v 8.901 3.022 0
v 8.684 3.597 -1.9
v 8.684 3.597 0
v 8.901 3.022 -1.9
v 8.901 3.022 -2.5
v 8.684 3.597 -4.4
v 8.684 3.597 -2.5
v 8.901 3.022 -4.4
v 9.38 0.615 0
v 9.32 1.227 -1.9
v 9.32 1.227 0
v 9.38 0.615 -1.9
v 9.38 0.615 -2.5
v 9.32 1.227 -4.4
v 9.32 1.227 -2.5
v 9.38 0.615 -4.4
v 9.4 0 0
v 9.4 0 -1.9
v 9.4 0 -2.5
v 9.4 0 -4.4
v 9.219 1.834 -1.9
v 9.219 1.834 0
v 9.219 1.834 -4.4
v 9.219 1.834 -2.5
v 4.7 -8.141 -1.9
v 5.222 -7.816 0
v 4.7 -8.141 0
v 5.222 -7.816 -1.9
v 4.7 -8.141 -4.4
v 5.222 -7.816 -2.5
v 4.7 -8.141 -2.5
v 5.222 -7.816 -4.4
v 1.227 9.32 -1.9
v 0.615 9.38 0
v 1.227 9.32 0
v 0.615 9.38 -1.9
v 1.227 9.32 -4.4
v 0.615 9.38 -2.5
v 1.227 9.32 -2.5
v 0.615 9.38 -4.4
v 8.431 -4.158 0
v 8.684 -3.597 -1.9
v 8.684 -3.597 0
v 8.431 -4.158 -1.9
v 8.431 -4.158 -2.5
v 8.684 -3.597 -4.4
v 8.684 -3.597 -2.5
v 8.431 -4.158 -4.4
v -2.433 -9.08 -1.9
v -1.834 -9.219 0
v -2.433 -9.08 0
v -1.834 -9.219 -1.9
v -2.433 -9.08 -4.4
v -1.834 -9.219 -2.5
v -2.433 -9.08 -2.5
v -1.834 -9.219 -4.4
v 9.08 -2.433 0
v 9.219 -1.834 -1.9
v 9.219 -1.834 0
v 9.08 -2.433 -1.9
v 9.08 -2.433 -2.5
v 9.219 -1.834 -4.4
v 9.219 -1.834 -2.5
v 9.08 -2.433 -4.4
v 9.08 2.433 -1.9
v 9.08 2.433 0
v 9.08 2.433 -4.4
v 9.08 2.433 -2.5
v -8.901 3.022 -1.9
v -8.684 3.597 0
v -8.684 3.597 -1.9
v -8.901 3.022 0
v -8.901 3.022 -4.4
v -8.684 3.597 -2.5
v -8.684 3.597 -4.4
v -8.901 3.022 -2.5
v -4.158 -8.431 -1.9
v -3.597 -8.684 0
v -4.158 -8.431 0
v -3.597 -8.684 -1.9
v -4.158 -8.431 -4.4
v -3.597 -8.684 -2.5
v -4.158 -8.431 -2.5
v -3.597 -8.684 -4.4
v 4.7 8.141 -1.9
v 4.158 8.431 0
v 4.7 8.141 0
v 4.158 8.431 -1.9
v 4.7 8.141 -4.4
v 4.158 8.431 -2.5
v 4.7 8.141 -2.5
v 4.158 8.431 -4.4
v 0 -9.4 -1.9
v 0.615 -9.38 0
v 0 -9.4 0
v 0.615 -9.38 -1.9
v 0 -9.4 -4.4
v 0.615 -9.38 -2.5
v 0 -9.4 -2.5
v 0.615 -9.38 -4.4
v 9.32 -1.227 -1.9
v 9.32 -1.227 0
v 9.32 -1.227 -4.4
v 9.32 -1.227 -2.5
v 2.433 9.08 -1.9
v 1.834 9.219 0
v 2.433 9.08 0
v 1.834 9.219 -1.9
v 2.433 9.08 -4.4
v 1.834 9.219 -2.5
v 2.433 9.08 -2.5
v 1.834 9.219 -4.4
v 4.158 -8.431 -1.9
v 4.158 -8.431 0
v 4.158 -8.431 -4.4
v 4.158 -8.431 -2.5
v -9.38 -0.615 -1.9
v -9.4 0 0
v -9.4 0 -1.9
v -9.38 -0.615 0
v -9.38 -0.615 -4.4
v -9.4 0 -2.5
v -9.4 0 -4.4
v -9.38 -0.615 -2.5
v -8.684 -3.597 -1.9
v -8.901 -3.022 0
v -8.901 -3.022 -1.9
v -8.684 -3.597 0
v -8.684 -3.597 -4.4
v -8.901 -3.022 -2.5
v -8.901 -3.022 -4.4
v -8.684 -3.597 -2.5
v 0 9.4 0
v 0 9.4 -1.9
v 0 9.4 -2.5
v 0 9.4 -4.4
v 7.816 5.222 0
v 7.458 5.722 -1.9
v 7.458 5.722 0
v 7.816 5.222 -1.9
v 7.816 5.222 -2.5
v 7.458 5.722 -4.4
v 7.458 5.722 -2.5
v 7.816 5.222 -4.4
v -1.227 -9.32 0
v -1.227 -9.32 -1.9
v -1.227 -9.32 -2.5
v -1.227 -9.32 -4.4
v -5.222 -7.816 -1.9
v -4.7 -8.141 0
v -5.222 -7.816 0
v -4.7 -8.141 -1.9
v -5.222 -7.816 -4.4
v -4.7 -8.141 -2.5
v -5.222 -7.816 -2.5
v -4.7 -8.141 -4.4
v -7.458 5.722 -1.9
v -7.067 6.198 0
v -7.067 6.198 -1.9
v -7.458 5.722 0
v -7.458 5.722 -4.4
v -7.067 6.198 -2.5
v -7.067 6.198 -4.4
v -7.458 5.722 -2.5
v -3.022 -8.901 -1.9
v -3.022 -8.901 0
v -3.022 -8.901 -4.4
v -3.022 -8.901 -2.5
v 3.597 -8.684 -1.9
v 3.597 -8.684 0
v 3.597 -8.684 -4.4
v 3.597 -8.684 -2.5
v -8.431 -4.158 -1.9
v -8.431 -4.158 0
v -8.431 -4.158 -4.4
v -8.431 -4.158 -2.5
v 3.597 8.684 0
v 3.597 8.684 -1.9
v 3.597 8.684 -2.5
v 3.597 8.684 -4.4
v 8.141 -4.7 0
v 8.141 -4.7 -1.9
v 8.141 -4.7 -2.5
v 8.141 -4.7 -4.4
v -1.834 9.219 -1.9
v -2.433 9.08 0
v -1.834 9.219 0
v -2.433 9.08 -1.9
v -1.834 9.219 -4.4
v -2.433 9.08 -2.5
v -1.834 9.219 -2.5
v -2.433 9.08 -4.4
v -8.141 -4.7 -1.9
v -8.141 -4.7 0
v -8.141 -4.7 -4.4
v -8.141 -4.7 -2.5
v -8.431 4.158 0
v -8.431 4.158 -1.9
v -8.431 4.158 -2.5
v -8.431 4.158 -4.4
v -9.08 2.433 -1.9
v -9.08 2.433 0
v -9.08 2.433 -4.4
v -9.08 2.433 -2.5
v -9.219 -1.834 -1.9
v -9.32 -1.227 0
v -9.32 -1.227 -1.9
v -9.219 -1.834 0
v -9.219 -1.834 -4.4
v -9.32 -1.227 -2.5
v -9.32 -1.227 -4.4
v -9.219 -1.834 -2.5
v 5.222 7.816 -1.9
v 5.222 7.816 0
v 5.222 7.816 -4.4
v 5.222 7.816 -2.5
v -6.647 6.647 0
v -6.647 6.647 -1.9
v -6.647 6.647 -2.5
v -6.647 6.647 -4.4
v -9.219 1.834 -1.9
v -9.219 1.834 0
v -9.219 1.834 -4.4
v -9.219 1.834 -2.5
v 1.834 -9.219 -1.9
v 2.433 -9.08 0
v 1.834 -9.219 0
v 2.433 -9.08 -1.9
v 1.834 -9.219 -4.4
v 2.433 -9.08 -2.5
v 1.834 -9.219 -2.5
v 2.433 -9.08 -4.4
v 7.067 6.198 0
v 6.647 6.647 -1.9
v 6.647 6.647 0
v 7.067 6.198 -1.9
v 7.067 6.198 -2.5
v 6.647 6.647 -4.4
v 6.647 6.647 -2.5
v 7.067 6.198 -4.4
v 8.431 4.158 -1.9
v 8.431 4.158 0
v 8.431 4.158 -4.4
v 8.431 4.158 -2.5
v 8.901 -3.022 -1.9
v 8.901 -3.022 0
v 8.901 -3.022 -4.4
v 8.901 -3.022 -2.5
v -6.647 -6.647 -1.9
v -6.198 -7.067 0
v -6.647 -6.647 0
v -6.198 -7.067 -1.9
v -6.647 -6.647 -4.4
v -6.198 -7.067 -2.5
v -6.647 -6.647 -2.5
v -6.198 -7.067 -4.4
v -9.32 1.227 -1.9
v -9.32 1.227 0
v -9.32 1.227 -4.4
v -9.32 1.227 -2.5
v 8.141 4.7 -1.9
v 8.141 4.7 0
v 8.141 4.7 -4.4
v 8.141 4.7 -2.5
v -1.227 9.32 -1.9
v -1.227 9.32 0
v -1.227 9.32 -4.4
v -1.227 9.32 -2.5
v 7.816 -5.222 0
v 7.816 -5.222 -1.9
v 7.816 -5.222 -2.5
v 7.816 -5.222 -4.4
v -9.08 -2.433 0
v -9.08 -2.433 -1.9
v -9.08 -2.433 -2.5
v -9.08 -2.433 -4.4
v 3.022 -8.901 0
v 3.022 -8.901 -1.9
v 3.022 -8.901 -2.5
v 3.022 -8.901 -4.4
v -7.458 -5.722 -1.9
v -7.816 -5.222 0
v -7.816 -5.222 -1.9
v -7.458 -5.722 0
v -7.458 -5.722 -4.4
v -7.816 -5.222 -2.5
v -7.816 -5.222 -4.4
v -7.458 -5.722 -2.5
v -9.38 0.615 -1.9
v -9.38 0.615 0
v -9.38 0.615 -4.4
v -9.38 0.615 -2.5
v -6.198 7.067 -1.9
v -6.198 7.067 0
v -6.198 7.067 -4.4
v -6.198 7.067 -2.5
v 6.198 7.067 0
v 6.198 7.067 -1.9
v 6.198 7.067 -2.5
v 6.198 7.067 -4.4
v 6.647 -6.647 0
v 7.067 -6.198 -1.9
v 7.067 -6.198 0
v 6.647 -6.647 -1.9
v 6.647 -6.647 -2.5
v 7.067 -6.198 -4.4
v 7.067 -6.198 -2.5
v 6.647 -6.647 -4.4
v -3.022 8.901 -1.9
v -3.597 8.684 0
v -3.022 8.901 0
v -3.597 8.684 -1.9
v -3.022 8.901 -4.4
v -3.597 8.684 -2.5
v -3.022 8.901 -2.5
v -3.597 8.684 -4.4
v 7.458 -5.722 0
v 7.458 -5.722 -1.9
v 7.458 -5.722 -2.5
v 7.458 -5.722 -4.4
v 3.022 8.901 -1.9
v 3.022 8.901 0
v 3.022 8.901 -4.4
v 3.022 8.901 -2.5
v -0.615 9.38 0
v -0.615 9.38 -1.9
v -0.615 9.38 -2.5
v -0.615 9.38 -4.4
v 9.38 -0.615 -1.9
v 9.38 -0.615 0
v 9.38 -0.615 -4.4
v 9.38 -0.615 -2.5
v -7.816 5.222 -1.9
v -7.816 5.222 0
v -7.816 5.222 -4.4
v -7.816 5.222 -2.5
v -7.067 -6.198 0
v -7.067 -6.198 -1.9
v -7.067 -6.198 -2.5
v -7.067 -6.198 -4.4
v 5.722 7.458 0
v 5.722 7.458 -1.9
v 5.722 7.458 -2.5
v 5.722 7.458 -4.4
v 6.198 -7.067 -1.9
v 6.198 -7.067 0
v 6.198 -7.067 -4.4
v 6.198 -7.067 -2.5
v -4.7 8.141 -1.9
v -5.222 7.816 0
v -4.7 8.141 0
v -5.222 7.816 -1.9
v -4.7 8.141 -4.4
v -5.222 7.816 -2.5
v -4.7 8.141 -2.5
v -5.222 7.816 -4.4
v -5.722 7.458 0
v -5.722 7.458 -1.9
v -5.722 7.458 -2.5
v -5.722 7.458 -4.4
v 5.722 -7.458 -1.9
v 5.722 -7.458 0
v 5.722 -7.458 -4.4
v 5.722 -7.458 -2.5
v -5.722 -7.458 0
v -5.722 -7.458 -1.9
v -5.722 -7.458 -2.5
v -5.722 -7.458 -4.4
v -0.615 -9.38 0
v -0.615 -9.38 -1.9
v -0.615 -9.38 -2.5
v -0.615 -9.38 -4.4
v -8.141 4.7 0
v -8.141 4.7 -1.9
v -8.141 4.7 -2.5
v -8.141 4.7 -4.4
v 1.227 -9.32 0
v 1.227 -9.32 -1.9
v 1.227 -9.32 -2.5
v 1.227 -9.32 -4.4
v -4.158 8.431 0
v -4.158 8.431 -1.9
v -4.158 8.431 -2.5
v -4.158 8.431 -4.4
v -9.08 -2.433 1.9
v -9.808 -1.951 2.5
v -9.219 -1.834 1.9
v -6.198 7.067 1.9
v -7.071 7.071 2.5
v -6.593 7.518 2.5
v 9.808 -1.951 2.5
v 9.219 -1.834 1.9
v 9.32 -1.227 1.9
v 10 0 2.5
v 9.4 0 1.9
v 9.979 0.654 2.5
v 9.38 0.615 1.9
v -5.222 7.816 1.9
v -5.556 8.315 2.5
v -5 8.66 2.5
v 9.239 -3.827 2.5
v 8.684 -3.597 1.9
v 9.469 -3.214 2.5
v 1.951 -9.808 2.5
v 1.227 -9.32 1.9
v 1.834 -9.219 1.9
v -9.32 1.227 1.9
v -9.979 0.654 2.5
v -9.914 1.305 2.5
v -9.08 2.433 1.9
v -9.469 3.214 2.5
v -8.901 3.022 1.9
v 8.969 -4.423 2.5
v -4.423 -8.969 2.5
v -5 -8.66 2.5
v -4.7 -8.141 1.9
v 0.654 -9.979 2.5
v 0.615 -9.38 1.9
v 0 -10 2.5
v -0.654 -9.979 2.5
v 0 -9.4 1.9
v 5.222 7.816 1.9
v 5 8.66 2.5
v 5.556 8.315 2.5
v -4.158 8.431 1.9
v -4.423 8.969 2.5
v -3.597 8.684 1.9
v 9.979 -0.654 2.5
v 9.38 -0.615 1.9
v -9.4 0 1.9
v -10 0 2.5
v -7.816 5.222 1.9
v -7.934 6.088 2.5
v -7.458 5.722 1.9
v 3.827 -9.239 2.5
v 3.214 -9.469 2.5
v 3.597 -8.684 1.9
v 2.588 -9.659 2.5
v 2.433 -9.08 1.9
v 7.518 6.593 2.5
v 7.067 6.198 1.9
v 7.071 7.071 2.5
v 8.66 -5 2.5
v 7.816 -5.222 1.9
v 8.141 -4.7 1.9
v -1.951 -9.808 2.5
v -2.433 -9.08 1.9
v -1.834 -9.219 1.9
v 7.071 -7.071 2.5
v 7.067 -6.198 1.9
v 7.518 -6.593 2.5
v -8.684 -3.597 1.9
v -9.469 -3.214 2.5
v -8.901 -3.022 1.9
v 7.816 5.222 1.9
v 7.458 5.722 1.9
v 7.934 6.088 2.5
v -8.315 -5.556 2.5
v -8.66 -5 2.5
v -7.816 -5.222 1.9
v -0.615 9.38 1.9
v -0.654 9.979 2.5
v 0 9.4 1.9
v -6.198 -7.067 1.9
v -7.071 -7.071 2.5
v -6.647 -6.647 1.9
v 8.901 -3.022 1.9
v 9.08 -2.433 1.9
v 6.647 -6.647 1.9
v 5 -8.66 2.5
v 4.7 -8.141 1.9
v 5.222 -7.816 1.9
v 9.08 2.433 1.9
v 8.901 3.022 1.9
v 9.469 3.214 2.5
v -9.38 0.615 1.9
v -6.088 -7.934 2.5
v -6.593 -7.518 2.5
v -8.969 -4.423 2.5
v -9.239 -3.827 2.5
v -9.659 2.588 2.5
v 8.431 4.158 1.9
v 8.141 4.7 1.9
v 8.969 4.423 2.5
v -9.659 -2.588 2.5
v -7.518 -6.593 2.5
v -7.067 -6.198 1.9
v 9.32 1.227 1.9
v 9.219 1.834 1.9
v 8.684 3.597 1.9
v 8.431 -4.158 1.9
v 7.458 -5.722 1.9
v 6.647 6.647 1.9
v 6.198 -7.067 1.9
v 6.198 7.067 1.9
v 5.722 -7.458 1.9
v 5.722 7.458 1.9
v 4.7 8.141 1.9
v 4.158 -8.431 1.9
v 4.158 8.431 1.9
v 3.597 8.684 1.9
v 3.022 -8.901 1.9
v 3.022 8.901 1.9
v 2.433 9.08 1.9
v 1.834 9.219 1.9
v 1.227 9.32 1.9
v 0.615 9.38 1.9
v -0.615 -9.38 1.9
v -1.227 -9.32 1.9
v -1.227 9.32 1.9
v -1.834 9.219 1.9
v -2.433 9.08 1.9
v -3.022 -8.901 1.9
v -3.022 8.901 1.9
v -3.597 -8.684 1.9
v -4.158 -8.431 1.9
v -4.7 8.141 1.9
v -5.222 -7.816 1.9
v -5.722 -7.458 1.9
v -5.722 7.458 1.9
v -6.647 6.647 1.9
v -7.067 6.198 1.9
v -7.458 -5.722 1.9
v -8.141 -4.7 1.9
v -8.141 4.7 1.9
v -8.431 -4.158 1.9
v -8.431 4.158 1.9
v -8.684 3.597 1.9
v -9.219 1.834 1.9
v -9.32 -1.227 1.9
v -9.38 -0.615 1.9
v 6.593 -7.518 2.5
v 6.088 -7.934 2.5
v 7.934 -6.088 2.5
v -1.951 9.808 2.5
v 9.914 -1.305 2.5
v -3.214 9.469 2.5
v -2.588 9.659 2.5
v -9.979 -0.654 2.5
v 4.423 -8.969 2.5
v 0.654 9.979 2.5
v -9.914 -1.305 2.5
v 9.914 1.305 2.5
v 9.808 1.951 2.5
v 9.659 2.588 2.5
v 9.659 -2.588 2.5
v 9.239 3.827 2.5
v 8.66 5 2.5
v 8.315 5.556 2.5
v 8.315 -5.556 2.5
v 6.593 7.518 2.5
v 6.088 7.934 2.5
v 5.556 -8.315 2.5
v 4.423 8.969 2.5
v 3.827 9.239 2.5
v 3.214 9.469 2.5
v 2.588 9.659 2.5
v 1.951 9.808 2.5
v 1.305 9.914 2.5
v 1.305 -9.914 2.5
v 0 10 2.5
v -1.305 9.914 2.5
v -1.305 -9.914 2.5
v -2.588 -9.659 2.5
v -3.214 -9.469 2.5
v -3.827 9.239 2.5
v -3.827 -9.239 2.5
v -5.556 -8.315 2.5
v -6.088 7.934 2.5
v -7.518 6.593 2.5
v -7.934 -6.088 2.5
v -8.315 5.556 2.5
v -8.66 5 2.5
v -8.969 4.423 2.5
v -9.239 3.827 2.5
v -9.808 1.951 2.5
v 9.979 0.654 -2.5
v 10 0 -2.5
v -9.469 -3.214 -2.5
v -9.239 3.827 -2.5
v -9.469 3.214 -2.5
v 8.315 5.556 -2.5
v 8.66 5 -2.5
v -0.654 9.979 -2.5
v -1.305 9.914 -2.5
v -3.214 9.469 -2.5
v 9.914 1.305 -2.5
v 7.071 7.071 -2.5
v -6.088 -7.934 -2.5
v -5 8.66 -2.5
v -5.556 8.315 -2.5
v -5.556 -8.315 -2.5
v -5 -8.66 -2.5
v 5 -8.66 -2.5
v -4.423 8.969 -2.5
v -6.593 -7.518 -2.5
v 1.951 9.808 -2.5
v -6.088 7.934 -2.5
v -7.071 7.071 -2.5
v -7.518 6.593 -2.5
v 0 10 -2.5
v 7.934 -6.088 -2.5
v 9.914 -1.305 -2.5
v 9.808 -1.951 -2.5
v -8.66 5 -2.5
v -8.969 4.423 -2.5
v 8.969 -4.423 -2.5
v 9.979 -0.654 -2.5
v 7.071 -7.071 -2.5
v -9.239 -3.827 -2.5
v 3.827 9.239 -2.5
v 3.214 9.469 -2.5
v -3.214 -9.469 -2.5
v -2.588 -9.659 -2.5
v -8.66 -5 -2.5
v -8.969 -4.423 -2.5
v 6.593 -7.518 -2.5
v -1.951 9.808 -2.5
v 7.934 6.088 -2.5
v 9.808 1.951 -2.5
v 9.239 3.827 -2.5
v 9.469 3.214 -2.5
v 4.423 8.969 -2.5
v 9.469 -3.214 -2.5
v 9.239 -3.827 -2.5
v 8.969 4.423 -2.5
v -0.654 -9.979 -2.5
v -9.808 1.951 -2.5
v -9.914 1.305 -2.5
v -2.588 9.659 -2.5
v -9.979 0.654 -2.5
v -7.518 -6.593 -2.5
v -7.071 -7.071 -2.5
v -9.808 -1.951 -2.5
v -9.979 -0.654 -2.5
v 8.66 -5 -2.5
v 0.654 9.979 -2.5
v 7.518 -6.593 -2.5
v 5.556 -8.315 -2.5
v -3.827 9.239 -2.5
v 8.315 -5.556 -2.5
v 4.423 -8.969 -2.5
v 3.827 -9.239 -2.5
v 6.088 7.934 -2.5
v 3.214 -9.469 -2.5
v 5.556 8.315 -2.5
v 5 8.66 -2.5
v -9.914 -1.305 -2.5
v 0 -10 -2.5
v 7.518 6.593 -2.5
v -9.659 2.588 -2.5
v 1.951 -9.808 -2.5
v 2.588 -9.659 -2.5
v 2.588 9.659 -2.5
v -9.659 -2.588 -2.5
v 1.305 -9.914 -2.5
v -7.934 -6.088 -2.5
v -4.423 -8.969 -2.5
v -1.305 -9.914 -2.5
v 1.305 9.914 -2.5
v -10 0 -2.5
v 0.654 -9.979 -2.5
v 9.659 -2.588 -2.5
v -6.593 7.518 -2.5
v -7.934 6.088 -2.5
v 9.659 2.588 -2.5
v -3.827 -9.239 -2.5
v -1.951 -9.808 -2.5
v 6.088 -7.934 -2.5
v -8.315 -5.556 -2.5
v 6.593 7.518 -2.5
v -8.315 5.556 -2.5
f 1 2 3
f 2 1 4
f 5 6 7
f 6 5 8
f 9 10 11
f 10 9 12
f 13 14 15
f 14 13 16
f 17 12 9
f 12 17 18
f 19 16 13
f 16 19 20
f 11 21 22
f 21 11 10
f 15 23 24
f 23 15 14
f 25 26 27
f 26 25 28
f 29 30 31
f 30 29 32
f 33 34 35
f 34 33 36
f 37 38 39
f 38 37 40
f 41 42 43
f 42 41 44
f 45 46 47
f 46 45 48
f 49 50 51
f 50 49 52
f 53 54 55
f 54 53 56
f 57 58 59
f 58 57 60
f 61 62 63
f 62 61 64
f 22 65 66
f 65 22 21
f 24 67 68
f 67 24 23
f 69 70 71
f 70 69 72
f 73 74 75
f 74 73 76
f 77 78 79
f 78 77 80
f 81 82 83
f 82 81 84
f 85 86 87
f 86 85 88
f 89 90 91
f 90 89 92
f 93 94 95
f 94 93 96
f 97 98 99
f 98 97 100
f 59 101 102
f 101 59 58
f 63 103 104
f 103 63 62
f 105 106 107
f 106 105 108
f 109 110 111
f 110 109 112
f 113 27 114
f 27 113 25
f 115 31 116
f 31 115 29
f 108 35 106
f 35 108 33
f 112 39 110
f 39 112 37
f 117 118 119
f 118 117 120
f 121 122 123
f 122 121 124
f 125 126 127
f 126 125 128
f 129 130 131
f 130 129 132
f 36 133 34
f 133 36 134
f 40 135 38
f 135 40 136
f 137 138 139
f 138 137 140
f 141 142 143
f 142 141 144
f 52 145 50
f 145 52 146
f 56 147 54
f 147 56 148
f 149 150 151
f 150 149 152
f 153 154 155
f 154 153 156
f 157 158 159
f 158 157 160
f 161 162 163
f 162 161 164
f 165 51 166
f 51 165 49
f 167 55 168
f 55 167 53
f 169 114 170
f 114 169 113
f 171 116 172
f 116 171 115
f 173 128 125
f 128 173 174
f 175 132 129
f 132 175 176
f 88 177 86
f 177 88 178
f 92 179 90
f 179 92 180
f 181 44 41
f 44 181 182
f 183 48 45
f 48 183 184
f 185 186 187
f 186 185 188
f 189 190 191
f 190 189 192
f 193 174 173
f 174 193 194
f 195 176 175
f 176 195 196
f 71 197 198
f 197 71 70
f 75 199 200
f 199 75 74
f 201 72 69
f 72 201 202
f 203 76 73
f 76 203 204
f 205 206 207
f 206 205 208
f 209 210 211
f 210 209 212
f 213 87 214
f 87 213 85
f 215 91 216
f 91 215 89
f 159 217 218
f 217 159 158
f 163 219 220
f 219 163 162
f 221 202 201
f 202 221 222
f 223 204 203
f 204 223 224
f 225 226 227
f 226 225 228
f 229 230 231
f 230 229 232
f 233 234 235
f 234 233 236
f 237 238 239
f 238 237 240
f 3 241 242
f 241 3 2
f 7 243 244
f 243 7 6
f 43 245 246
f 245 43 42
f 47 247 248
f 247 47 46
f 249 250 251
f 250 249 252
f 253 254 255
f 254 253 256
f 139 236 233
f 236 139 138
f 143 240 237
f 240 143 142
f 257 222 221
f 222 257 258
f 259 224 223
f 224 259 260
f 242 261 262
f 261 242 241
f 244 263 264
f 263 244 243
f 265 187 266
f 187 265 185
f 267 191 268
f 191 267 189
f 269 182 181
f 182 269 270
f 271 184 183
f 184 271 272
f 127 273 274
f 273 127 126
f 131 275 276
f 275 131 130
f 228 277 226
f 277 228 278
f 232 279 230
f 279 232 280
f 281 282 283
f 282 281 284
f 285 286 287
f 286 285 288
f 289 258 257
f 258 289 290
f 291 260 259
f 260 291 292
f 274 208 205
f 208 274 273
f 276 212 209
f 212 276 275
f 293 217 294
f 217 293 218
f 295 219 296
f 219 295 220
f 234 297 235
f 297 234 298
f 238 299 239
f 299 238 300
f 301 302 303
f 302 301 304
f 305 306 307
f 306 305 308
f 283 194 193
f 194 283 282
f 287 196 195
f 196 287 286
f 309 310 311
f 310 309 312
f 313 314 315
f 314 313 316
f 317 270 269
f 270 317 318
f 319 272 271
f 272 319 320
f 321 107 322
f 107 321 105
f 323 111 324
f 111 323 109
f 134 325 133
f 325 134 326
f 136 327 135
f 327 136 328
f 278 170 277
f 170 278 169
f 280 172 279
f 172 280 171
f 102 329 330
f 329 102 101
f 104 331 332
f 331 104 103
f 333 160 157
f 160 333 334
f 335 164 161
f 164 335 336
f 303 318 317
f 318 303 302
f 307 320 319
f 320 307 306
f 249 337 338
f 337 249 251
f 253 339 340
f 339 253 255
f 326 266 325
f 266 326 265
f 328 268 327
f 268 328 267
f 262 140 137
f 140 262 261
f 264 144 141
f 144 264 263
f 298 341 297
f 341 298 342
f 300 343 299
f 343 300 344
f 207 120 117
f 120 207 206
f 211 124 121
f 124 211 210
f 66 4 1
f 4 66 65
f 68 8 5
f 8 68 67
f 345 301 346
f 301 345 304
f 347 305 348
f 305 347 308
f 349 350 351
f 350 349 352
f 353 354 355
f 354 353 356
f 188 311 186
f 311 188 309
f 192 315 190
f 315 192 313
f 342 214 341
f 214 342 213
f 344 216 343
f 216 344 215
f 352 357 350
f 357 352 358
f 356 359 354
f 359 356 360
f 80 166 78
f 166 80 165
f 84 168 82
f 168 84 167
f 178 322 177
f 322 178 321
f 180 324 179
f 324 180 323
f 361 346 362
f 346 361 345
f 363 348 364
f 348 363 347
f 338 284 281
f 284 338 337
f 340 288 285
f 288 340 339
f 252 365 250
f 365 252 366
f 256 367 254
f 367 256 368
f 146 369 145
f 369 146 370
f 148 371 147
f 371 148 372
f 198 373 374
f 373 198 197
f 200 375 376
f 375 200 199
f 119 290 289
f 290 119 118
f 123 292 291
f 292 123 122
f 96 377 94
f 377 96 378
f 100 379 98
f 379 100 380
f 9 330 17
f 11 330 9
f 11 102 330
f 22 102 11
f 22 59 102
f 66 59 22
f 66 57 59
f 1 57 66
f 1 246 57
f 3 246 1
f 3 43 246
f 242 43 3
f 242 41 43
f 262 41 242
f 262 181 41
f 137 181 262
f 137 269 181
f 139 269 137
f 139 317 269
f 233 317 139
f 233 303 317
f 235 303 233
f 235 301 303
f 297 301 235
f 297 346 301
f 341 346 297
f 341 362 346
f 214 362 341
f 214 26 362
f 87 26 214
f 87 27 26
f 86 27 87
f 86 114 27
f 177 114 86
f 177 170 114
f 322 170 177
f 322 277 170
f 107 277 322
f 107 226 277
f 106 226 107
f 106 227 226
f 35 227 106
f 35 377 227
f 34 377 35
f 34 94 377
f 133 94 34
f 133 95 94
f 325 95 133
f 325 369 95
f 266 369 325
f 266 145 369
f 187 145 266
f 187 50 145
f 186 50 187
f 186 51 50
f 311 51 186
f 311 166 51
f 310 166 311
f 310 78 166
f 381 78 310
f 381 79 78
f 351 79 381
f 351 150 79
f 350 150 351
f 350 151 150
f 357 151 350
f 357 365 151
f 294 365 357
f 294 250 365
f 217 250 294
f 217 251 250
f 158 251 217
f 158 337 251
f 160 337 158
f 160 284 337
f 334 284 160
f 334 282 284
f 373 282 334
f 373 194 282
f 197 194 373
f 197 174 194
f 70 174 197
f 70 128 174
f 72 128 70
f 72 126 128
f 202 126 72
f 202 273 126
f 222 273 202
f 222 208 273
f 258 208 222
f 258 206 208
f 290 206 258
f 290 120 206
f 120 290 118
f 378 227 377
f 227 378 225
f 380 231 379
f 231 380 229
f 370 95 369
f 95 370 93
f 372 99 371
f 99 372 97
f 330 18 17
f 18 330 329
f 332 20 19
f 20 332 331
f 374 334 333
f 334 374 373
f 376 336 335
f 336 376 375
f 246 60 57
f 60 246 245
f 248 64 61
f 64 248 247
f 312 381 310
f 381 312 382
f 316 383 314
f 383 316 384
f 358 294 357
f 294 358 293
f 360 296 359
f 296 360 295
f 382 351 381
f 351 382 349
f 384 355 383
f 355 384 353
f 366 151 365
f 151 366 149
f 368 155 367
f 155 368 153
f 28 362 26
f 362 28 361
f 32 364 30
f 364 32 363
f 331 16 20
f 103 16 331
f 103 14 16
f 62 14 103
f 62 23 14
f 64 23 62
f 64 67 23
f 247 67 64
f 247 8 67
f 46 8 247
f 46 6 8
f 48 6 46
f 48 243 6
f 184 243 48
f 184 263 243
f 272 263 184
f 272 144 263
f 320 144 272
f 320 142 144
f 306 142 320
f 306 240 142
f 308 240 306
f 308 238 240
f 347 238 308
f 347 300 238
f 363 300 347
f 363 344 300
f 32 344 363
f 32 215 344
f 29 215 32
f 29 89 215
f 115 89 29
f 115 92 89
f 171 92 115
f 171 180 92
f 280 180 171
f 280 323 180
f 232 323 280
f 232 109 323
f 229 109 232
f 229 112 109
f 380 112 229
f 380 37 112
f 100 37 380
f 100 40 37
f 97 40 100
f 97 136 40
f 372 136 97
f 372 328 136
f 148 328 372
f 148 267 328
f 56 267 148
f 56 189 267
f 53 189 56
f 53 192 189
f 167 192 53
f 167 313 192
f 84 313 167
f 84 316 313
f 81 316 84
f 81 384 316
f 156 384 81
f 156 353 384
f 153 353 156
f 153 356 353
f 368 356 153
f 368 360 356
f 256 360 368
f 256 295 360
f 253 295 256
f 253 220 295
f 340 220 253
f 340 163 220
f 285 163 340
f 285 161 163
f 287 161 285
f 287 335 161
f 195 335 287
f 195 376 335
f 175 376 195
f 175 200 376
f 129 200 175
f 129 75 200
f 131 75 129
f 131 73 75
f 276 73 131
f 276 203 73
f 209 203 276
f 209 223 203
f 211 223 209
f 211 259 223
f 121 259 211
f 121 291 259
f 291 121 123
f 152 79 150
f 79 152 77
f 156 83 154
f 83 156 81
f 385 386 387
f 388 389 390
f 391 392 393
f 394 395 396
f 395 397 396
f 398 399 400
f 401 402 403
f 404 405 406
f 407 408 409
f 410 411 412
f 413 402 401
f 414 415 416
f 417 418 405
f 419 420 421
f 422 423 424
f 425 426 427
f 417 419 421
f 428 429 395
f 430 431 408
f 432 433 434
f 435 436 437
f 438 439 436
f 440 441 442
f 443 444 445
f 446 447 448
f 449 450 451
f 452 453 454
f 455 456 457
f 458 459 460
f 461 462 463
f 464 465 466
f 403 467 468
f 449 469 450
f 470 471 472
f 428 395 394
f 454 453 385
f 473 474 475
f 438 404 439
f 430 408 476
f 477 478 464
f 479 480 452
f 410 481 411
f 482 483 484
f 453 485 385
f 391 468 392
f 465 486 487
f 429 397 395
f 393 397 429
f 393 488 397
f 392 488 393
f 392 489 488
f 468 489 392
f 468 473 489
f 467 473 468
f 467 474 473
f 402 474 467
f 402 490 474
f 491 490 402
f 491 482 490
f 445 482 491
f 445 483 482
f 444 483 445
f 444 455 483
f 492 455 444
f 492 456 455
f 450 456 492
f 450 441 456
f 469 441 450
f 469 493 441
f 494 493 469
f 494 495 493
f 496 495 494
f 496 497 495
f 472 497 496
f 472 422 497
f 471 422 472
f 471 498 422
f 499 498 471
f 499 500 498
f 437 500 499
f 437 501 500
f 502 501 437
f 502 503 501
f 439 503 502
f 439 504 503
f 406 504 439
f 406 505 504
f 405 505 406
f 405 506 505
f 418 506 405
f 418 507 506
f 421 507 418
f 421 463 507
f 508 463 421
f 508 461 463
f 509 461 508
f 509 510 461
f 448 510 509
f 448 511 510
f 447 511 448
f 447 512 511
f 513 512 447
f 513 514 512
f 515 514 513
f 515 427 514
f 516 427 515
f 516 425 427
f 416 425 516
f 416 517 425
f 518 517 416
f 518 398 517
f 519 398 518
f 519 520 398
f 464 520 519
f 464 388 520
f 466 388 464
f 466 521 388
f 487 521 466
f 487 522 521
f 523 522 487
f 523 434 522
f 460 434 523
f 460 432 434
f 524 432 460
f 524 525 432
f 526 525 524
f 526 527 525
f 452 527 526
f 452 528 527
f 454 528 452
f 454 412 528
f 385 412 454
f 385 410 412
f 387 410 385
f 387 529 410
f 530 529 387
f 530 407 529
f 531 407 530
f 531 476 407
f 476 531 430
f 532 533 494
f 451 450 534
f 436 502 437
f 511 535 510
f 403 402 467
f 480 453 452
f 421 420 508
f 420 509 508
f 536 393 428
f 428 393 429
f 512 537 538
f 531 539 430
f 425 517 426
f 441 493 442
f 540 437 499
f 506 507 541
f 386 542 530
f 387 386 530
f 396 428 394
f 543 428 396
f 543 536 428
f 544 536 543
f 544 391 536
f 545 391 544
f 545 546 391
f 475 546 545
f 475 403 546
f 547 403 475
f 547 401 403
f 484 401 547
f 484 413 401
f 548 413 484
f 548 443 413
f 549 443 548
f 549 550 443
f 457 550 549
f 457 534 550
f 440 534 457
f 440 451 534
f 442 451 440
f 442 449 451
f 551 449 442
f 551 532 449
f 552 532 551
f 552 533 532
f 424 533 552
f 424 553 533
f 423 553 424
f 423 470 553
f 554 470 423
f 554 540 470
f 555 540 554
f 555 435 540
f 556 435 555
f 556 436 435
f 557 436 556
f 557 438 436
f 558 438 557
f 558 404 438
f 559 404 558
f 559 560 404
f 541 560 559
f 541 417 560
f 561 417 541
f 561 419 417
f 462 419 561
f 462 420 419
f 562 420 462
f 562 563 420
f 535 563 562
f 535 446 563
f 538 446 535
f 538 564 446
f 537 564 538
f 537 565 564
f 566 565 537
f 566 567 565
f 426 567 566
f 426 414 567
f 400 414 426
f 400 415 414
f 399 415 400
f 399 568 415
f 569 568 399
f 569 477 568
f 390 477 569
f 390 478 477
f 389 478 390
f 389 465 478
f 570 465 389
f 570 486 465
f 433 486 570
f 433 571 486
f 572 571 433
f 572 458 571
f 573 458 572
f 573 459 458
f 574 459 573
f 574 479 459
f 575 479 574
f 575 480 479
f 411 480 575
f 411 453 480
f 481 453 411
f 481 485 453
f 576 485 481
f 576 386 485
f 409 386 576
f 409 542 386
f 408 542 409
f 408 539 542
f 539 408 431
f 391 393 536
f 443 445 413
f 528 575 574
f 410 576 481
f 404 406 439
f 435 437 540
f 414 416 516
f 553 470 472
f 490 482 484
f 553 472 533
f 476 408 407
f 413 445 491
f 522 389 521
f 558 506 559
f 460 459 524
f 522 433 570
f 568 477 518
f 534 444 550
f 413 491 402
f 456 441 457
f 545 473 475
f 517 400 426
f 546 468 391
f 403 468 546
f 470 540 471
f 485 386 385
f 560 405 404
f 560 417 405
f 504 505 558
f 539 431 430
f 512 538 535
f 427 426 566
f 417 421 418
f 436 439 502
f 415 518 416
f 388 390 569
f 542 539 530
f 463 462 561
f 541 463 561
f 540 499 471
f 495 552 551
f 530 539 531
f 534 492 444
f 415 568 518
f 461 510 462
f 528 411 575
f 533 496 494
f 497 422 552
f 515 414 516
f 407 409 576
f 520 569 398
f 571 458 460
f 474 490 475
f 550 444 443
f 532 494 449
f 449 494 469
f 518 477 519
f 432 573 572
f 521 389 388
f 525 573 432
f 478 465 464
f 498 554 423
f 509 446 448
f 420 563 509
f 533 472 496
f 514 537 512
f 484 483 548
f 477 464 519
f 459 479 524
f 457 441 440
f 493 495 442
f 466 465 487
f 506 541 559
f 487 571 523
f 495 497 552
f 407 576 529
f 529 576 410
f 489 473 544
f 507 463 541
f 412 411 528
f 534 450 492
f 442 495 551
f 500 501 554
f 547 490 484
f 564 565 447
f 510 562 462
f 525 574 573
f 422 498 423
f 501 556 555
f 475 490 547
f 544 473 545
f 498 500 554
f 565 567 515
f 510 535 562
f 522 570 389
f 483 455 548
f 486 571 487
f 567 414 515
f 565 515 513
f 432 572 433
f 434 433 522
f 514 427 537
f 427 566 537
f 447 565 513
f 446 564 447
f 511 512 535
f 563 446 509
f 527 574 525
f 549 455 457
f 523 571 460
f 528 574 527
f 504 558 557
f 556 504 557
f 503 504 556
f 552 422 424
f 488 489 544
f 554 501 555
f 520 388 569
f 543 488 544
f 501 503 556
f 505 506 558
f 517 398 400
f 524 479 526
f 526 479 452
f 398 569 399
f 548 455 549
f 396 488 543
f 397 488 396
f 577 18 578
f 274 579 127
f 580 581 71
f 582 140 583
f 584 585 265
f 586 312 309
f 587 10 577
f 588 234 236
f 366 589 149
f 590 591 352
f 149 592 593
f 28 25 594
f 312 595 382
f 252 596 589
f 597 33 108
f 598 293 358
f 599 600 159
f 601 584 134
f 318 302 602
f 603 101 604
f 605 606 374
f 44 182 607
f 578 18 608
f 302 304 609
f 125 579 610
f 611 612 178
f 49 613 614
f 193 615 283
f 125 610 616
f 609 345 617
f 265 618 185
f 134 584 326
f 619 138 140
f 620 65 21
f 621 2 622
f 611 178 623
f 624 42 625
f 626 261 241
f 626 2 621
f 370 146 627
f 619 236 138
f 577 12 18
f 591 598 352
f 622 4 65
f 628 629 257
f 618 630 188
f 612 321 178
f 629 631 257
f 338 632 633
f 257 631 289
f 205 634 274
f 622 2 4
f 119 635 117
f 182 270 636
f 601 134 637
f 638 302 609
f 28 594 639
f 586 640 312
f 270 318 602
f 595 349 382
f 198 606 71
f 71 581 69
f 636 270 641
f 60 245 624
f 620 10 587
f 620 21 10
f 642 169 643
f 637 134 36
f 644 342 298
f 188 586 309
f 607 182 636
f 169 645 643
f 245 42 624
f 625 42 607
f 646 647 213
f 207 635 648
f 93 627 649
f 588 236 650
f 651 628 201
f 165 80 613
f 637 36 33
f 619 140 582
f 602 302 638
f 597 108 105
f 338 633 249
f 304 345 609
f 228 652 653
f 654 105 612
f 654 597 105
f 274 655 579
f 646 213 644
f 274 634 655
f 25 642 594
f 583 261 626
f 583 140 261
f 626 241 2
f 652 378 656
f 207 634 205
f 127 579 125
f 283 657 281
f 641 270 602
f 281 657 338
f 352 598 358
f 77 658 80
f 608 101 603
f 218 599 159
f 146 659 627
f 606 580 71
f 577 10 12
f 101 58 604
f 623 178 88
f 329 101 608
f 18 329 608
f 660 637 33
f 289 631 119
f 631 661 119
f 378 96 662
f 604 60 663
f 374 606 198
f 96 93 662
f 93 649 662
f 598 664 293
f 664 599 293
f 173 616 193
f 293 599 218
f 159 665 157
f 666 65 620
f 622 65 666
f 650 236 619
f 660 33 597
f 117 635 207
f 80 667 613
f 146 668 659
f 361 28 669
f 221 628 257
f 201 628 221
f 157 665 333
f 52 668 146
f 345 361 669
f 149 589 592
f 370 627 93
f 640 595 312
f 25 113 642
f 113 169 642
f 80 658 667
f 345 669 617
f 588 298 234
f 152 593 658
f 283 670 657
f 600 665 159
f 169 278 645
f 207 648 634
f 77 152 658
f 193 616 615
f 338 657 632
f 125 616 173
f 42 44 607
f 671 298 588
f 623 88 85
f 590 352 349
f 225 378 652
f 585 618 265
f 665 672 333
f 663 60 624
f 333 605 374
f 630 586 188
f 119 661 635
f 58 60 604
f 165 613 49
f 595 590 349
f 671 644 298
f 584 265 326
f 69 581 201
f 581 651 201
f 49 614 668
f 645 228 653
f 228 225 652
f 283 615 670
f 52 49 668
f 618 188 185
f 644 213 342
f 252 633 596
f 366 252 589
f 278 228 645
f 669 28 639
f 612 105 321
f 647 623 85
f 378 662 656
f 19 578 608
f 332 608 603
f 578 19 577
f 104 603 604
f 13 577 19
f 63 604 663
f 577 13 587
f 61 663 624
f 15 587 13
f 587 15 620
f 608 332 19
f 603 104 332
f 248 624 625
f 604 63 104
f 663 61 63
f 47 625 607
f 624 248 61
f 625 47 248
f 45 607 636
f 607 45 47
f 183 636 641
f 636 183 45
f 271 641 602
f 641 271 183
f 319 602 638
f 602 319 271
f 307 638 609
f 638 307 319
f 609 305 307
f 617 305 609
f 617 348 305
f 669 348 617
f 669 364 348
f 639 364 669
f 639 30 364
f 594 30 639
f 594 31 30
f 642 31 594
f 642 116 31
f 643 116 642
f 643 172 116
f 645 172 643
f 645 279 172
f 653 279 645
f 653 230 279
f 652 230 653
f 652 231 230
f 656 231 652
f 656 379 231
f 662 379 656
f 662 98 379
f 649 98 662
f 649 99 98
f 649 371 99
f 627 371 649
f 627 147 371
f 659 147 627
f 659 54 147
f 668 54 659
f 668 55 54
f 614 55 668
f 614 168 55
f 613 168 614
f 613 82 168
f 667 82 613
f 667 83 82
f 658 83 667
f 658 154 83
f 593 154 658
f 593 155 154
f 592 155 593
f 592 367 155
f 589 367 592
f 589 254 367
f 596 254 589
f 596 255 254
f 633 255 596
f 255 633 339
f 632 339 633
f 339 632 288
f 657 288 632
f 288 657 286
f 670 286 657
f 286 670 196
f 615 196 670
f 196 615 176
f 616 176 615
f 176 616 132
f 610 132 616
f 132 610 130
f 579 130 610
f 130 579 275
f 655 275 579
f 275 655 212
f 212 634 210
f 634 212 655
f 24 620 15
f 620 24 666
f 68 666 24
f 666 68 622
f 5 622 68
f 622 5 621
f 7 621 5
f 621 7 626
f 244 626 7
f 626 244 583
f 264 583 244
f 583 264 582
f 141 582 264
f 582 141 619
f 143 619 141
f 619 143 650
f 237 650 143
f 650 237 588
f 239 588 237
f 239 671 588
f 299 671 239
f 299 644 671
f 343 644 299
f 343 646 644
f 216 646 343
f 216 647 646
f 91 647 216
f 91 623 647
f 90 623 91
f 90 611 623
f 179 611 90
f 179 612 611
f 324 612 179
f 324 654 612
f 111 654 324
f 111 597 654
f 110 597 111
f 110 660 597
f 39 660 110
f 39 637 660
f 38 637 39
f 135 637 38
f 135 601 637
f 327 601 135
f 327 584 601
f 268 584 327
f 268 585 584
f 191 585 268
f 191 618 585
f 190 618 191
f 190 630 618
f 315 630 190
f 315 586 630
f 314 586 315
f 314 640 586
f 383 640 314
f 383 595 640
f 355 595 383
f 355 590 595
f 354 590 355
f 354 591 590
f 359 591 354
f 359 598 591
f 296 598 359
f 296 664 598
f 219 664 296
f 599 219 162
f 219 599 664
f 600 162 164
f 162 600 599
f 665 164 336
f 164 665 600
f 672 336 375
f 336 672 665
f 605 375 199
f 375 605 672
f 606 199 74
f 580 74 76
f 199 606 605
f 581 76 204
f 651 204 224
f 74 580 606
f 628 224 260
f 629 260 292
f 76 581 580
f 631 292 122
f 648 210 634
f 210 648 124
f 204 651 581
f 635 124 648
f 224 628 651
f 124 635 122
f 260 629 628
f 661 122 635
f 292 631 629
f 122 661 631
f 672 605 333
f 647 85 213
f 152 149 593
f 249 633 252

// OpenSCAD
$fn=96;

magnet_d = 20;
magnet_h = 5;
edge_chamfer = 0.6;

module chamfered_cylinder(d=20, h=5, c=0.6) {
    union() {
        translate([0,0,-h/2 + c/2])
            cylinder(d=d-2*c, h=h-c, center=true);
        translate([0,0, h/2 - c/2])
            cylinder(d1=d-2*c, d2=d, h=c, center=true);
        translate([0,0,-h/2 + c/2])
            cylinder(d1=d, d2=d-2*c, h=c, center=true);
    }
}

module magnet(d=20, h=5, c=0.6) {
    chamfered_cylinder(d=d, h=h, c=c);
}

magnet(d=magnet_d, h=magnet_h, c=edge_chamfer);
